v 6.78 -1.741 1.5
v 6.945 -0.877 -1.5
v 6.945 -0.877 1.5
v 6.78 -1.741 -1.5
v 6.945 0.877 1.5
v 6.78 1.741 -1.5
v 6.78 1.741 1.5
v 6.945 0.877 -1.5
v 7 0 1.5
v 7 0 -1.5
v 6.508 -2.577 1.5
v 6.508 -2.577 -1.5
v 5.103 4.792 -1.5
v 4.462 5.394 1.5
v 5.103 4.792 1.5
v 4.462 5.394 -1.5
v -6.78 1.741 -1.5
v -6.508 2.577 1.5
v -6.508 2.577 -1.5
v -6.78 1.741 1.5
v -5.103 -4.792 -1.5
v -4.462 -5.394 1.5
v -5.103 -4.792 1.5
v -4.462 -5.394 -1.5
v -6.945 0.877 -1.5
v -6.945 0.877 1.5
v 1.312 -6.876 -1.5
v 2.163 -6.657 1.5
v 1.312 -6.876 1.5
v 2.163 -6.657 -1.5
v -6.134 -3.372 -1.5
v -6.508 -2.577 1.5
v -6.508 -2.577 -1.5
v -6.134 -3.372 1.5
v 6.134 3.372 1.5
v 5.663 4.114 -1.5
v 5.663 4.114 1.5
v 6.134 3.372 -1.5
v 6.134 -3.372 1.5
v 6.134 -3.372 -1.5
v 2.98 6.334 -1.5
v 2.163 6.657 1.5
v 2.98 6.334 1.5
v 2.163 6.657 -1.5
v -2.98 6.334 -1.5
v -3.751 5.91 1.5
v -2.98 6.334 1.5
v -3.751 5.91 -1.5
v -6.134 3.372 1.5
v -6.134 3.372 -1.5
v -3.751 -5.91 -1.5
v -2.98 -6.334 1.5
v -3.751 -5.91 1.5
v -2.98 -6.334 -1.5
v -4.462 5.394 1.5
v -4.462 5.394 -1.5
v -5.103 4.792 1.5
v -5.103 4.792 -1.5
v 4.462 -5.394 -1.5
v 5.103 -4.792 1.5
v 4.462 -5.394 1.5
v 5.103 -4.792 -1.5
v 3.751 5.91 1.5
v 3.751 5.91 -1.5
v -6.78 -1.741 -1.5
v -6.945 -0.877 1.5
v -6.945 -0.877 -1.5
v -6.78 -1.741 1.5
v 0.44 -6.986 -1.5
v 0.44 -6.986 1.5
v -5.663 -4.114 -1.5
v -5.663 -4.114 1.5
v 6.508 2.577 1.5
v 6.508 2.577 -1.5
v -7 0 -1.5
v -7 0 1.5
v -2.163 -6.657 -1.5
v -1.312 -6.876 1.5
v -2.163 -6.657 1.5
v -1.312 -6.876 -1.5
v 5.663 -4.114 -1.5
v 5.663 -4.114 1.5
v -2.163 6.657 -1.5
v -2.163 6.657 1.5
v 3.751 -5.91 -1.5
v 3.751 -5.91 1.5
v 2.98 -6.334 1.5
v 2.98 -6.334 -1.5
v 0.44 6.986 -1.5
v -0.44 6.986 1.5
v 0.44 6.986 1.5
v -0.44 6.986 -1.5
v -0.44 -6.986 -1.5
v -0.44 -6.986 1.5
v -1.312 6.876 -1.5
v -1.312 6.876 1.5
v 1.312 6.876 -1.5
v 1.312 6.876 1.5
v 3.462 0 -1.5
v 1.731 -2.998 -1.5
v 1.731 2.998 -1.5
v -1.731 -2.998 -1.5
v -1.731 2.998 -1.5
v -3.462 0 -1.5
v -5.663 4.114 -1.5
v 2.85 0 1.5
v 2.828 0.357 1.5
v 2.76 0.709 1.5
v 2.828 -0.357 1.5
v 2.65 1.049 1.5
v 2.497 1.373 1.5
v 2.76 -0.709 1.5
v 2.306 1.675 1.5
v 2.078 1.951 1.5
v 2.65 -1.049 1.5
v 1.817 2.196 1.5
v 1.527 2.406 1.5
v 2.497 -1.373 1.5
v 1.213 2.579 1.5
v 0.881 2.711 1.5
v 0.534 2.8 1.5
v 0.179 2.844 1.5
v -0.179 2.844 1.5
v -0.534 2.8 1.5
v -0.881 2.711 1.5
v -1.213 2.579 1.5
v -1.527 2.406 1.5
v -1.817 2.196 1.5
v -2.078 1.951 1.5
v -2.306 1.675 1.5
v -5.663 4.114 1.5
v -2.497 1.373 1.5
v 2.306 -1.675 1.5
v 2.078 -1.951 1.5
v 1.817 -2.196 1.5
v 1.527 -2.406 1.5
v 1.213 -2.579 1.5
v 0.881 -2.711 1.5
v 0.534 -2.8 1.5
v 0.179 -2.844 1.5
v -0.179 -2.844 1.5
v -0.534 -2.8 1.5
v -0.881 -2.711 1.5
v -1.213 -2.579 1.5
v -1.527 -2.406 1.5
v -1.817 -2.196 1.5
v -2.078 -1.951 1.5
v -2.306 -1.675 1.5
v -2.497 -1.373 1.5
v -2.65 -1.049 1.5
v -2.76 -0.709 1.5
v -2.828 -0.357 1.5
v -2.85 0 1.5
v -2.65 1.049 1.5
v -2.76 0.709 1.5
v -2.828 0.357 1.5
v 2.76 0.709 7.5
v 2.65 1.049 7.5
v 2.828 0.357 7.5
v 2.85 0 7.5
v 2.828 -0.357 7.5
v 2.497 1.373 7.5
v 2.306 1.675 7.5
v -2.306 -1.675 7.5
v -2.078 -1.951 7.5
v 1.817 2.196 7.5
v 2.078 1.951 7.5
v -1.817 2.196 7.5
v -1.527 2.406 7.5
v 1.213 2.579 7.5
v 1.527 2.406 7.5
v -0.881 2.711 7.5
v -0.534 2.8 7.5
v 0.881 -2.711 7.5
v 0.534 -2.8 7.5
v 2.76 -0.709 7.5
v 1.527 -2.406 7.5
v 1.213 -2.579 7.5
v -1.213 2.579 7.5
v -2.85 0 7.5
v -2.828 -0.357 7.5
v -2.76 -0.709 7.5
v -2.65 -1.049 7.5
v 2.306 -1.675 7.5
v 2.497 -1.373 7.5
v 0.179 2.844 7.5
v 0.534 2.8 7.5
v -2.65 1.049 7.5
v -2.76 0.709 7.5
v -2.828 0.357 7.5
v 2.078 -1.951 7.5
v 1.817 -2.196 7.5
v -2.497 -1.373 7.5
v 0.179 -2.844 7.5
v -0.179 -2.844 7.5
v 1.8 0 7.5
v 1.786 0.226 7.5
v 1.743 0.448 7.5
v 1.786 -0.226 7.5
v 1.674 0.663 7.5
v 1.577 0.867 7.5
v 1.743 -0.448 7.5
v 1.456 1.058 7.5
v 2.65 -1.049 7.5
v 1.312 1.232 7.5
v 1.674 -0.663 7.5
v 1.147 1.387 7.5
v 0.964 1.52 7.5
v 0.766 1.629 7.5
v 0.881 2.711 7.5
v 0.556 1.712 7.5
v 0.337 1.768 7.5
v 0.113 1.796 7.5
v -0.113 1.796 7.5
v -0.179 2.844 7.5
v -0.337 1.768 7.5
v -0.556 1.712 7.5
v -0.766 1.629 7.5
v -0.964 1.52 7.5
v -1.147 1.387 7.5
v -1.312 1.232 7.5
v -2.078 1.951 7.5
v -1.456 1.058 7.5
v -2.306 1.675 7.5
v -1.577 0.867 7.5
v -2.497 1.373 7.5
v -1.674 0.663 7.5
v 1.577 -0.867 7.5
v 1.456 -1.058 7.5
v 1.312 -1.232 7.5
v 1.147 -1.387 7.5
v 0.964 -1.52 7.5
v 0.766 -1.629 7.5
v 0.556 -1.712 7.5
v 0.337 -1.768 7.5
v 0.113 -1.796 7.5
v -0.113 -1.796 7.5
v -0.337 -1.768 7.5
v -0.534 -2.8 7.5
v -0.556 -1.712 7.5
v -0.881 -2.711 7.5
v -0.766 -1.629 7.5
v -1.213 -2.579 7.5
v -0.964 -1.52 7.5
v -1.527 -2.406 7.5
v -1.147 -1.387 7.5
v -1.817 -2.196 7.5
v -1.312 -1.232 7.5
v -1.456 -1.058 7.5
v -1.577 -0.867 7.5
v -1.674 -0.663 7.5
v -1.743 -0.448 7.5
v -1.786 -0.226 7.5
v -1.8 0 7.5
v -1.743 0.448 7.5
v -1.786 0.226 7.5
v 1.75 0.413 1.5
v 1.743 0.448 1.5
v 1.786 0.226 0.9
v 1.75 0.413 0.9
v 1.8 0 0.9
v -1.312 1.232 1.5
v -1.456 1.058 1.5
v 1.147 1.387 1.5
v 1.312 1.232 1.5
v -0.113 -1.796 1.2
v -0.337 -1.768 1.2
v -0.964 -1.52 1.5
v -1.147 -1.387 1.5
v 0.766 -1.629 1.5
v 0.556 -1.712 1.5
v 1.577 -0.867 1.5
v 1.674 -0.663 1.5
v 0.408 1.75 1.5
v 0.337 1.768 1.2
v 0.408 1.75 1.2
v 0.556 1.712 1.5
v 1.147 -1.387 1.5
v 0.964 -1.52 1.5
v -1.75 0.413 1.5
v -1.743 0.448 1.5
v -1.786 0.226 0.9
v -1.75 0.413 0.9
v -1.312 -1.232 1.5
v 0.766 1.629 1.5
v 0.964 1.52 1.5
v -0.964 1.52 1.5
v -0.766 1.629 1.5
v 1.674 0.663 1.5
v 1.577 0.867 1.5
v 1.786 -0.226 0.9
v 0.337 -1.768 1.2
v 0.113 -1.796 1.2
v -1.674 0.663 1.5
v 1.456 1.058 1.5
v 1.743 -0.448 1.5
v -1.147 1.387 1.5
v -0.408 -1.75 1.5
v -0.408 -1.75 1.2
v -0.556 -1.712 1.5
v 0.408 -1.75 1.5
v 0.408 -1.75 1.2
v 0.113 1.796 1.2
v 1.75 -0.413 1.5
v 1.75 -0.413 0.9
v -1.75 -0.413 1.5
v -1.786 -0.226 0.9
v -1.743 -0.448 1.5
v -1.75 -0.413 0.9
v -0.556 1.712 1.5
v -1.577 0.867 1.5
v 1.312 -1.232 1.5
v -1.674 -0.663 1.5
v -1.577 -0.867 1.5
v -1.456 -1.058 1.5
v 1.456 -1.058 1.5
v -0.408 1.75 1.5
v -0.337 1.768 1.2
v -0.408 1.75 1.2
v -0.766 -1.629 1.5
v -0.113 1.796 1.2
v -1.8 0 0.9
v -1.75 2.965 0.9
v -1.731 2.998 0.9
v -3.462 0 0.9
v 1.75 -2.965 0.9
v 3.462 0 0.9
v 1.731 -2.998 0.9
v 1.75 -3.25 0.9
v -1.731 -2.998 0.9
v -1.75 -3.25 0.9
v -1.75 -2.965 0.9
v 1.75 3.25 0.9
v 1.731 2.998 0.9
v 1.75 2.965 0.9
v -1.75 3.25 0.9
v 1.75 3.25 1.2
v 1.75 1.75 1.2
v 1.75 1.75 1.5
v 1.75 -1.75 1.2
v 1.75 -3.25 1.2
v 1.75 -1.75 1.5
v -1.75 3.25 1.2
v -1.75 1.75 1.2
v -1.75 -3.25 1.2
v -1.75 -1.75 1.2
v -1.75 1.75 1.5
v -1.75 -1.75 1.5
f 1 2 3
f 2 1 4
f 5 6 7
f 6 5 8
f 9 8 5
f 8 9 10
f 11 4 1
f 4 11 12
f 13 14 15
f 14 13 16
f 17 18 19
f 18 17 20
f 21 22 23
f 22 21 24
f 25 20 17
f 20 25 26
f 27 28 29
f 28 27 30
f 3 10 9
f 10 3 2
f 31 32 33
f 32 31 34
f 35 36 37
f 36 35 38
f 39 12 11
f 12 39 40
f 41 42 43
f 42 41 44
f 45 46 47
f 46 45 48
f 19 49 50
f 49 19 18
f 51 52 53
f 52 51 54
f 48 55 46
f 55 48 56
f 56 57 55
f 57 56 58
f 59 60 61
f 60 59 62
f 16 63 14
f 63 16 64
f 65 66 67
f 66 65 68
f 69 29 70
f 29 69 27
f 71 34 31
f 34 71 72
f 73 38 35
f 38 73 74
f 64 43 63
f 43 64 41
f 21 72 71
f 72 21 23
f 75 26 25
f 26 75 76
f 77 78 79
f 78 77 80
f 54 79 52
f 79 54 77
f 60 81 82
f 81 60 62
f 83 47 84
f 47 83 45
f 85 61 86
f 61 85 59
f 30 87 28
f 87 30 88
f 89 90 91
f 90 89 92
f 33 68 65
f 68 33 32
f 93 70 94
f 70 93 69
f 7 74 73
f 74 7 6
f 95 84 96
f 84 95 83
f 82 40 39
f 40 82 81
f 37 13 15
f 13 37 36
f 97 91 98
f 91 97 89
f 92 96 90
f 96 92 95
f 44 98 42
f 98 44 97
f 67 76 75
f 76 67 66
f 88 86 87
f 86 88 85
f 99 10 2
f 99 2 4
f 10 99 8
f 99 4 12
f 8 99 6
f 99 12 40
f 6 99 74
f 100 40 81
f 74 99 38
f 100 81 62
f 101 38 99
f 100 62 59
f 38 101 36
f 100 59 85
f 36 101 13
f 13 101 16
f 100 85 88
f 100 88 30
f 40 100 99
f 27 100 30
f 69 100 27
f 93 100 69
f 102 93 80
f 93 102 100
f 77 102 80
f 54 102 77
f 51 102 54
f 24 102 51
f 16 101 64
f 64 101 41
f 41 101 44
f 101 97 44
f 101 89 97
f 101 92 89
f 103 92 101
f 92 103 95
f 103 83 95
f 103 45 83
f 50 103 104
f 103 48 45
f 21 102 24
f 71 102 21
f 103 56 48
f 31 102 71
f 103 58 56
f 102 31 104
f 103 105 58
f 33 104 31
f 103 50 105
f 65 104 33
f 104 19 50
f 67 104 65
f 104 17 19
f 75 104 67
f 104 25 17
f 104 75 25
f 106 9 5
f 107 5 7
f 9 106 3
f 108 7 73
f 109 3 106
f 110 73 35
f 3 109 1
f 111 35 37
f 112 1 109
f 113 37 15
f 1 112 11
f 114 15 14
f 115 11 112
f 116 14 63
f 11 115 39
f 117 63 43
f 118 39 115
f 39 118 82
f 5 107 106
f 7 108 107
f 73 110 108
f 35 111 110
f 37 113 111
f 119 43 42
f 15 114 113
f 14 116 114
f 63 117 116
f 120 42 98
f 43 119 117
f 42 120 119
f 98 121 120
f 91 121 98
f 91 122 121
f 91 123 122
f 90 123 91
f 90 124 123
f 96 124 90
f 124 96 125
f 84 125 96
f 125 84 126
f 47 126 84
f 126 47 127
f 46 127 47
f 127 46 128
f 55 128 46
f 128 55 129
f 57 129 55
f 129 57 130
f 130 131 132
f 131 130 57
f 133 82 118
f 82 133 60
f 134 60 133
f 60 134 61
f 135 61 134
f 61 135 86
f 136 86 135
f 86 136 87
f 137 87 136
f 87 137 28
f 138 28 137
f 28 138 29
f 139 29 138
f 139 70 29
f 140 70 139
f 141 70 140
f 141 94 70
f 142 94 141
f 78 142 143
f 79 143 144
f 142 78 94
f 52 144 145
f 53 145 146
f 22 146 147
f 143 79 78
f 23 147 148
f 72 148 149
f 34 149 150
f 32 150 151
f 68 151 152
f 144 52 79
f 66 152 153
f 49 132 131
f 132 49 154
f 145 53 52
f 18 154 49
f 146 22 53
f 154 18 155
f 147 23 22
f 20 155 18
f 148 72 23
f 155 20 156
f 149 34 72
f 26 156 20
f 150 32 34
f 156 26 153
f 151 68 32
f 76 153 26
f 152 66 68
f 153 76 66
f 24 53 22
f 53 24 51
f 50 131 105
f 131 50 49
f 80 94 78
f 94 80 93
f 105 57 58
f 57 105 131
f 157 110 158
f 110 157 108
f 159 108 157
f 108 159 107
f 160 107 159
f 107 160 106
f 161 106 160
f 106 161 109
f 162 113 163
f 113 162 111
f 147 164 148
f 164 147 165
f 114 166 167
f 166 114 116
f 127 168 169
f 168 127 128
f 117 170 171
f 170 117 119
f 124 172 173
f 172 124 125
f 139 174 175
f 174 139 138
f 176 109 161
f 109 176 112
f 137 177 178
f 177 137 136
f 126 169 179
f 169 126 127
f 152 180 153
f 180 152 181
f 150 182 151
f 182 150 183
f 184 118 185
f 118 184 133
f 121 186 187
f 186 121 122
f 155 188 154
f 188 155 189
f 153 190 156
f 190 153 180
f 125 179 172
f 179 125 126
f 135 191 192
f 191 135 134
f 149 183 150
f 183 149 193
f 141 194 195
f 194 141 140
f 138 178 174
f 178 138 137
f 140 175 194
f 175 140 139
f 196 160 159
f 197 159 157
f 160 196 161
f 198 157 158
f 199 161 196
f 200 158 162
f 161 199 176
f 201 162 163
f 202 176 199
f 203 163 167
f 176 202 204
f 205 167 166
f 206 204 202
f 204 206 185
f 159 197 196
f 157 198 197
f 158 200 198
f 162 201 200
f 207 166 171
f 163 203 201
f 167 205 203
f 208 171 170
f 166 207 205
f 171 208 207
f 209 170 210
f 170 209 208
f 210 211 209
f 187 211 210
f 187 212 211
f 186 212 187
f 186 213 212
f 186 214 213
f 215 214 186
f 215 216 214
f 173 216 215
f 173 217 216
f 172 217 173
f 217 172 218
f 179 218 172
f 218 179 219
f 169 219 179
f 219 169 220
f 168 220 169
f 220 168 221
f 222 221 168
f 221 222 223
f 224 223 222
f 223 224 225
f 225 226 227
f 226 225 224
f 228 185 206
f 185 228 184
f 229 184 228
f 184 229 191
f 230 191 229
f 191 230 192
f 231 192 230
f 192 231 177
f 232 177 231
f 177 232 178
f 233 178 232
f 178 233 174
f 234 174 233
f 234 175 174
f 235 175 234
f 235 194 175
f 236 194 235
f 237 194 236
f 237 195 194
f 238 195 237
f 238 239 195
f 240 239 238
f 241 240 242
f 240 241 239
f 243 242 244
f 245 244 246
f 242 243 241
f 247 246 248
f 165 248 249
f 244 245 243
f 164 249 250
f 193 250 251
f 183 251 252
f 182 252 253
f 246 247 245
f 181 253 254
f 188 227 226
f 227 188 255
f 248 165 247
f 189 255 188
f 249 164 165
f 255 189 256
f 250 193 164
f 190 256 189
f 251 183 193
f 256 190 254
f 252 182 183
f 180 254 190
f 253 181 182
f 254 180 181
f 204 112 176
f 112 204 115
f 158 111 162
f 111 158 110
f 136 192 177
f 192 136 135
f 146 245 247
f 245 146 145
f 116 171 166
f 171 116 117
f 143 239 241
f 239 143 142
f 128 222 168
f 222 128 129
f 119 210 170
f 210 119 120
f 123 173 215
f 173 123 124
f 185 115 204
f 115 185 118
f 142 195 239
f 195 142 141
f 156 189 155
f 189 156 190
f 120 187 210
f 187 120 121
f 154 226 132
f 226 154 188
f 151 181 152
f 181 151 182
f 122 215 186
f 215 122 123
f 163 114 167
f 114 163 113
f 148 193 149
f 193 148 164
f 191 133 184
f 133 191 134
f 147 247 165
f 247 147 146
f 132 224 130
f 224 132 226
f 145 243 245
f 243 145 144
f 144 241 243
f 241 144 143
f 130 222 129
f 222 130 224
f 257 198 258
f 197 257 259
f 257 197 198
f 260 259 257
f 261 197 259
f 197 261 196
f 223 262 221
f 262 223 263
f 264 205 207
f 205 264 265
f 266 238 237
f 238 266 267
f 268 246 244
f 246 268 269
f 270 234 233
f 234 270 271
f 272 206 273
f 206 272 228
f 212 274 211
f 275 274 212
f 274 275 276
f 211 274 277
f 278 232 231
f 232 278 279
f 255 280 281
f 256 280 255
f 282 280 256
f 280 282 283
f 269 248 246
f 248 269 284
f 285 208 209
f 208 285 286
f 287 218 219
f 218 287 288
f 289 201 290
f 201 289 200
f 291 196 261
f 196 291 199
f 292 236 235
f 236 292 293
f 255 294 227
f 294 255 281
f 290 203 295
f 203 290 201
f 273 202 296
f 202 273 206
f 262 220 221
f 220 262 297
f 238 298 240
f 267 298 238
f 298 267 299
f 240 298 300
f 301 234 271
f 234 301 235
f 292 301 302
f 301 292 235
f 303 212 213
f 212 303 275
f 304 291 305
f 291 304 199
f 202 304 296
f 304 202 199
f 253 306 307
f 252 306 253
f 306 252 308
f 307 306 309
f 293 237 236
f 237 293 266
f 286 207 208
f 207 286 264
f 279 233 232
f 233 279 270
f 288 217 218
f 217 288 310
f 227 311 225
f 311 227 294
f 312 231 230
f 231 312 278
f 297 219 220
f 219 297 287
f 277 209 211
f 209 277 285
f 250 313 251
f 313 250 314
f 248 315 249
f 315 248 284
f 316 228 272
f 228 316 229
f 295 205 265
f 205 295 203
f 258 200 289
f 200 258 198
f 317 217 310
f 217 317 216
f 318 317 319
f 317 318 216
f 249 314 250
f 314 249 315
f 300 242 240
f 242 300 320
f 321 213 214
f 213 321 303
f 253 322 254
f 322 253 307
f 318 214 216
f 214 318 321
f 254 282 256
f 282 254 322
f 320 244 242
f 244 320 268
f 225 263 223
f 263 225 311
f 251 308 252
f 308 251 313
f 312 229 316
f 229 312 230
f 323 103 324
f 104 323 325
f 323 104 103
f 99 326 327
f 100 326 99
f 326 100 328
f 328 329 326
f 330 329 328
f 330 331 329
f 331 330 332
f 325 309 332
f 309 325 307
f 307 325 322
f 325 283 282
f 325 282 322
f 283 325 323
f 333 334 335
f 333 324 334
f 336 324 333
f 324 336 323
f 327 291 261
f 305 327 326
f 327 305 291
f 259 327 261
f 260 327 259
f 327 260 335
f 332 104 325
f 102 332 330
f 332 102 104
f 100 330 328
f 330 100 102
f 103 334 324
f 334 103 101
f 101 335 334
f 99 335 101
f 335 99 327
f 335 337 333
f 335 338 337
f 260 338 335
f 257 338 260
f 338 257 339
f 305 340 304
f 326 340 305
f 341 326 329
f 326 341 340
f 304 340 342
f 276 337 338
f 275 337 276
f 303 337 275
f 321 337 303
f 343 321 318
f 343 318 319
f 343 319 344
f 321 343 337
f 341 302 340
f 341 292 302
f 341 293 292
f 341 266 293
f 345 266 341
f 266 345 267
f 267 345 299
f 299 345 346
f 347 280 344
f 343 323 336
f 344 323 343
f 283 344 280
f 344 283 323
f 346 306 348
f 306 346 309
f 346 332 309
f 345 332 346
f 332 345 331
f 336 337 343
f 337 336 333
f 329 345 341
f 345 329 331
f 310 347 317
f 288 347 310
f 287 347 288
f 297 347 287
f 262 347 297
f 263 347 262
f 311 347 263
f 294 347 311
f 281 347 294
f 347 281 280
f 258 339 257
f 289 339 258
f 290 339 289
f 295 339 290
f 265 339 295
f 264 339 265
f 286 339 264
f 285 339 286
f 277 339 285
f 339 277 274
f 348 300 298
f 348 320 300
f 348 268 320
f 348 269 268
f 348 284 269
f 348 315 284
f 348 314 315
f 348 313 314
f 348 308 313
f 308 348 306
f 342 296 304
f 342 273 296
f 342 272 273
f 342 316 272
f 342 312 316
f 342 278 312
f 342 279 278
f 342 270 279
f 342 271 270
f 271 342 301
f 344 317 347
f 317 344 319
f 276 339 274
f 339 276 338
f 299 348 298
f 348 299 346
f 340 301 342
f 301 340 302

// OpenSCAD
$fn = 50;


difference() {
	union() {
		translate(v = [0, 0, -1.5000000000]) {
			rotate(a = [0, 0, 0]) {
				cylinder(h = 3, r = 7.0000000000);
			}
		}
		translate(v = [0, 0, -1.5000000000]) {
			rotate(a = [0, 0, 0]) {
				cylinder(h = 9, r = 2.8500000000);
			}
		}
	}
	union() {
		translate(v = [0, 0, -125.0000000000]) {
			rotate(a = [0, 0, 0]) {
				cylinder(h = 250, r = 1.8000000000);
			}
		}
		translate(v = [0, 0, -2.1000000000]) {
			rotate(a = [0, 0, 0]) {
				#translate(v = [0, 0, 0]) {
					rotate(a = [0, 0, 0]) {
						linear_extrude(height = 3) {
							polygon(points = [[3.4620000000, 0.0000000000], [1.7310000000, 2.9981799479], [-1.7310000000, 2.9981799479], [-3.4620000000, 0.0000000000], [-1.7310000000, -2.9981799479], [1.7310000000, -2.9981799479]]);
						}
					}
				}
			}
		}
		#translate(v = [-1.7500000000, -3.2500000000, 0.9000000000]) {
			rotate(a = [0, 0, 0]) {
				cube(size = [3.5000000000, 6.5000000000, 0.3000000000]);
			}
		}
		#translate(v = [-1.7500000000, -1.7500000000, 1.2000000000]) {
			rotate(a = [0, 0, 0]) {
				cube(size = [3.5000000000, 3.5000000000, 0.3000000000]);
			}
		}
		#translate(v = [-1.7500000000, -3.2500000000, -2.4000000000]) {
			rotate(a = [0, 0, 0]) {
				cube(size = [3.5000000000, 6.5000000000, 0.3000000000]);
			}
		}
		#translate(v = [-1.7500000000, -1.7500000000, -2.7000000000]) {
			rotate(a = [0, 0, 0]) {
				cube(size = [3.5000000000, 3.5000000000, 0.3000000000]);
			}
		}
	}
}
